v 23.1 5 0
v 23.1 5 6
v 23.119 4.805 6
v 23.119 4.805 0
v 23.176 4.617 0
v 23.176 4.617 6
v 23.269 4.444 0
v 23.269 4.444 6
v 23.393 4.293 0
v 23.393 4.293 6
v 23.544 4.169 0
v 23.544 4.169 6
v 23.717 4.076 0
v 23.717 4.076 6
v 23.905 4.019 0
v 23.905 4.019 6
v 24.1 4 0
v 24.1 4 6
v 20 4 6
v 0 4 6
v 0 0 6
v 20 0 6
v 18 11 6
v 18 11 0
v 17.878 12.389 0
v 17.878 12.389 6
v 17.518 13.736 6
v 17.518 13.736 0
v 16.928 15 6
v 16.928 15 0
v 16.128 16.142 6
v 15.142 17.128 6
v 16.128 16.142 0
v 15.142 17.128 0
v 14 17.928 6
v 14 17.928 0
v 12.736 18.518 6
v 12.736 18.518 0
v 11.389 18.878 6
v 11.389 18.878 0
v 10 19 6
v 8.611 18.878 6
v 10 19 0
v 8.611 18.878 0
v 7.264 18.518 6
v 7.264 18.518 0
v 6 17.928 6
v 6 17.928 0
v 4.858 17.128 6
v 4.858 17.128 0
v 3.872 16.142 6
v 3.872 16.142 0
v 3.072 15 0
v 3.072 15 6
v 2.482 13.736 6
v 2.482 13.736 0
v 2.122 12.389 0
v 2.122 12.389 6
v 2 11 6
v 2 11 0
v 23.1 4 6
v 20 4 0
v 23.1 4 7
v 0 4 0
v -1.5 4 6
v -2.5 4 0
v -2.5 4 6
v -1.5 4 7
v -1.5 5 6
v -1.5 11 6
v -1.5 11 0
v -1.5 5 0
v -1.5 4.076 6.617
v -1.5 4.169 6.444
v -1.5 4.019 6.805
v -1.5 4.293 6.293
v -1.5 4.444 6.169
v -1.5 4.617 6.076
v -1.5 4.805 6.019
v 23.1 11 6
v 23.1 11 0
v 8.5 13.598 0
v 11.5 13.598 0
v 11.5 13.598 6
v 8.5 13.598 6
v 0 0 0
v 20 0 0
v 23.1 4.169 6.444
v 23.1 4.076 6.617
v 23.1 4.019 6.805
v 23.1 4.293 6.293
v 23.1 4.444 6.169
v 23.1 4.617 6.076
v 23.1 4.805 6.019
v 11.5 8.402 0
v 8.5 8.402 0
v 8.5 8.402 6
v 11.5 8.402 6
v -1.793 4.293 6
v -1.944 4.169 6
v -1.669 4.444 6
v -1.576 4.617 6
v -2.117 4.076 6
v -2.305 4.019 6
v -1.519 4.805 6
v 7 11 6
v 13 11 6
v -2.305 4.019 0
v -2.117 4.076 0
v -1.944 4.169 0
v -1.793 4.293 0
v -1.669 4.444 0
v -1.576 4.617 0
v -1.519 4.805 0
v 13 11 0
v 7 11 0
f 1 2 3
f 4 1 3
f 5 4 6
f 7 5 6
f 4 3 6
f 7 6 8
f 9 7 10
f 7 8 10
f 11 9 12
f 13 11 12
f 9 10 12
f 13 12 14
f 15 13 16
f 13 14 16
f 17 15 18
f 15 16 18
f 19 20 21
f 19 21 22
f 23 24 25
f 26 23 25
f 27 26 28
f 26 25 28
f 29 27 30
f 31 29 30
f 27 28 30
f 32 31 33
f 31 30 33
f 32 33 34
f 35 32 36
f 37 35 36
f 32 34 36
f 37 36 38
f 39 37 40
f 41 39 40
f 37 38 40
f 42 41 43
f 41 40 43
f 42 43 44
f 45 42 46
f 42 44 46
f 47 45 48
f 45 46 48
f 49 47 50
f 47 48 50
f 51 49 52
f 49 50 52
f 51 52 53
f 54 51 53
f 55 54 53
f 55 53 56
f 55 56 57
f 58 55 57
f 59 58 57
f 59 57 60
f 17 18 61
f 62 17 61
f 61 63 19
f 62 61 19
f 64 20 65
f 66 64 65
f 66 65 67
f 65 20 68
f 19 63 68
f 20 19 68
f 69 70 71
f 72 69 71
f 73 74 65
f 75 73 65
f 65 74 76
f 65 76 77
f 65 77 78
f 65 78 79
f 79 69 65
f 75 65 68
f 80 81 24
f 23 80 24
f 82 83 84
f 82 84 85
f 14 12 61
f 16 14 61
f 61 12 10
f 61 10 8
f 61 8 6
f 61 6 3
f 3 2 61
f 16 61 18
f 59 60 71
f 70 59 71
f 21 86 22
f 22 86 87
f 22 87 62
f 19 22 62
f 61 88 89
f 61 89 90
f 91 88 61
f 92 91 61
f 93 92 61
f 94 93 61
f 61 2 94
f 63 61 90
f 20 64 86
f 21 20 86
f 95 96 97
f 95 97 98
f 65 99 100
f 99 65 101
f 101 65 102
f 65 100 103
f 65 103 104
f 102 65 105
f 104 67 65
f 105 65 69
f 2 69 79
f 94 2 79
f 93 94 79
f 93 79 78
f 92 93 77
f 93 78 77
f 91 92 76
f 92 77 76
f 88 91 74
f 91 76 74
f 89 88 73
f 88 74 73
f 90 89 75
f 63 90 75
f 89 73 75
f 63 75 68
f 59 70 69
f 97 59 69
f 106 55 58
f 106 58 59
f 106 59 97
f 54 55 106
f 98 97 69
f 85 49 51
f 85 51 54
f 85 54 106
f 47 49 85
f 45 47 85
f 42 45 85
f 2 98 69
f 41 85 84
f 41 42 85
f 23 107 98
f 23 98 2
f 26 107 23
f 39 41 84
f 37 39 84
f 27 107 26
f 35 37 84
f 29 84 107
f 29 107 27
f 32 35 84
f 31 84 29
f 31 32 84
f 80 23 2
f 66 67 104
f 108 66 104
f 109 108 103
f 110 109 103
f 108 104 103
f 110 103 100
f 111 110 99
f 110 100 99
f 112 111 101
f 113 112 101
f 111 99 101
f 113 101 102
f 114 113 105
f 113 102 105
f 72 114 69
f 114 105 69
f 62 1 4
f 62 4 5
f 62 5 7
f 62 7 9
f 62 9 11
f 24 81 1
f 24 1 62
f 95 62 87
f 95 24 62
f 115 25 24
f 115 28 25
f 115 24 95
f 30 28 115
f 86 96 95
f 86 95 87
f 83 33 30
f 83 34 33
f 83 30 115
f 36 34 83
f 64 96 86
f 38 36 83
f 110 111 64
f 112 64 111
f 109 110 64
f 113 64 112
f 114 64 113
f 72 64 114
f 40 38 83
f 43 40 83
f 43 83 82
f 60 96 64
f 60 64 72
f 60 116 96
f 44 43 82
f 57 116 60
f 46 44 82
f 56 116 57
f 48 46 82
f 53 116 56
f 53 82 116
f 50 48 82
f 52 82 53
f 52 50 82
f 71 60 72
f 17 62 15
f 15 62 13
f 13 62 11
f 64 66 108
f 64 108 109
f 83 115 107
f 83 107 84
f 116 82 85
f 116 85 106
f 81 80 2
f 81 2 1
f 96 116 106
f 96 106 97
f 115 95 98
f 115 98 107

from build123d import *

# Parameters (mm, degrees)
BOSS_EXTRUDE1_DEPTH = 6
BOSS_EXTRUDE2_DEPTH = 24.6
BOSS_EXTRUDE3_DEPTH = 6


with BuildPart() as part:
    # Sketch1 → Boss-Extrude1 (new body)
    with BuildSketch(Plane.XY):
        with BuildLine():
            Line((0, 0), (20, 0))
            Line((20, 0), (20, 4))
            Line((20, 4), (23.1, 4))
            Line((23.1, 4), (23.1, 11))
            Line((23.1, 11), (18, 11))
            ThreePointArc((18, 11), (10, 19), (2, 11))
            Line((2, 11), (-1.5, 11))
            Line((-1.5, 11), (-1.5, 4))
            Line((-1.5, 4), (0, 4))
            Line((0, 4), (0, 0))
        make_face()
        Polygon((13, 11), (11.5, 13.598076211), (8.5, 13.598076211), (7, 11), (8.5, 8.401923789), (11.5, 8.401923789), align=None, mode=Mode.SUBTRACT)
    extrude(amount=BOSS_EXTRUDE1_DEPTH)

    # Sketch2 → Boss-Extrude2 (add)
    with BuildSketch(Plane.ZY.offset(1.5)):
        with BuildLine():
            Line((6, 4), (6, 5))
            ThreePointArc((6, 5), (6.292893219, 4.292893219), (7, 4))
            Line((7, 4), (6, 4))
        make_face()
    extrude(amount=-BOSS_EXTRUDE2_DEPTH)

    # Sketch4 → Boss-Extrude3 (add)
    with BuildSketch(Plane.XY.offset(6)):
        with BuildLine():
            Line((23.1, 4), (23.1, 5))
            ThreePointArc((23.1, 5), (23.392893219, 4.292893219), (24.1, 4))
            Line((24.1, 4), (23.1, 4))
        make_face()
        with BuildLine():
            Line((-1.5, 4), (-2.5, 4))
            ThreePointArc((-2.5, 4), (-1.792893219, 4.292893219), (-1.5, 5))
            Line((-1.5, 5), (-1.5, 4))
        make_face()
    extrude(amount=-BOSS_EXTRUDE3_DEPTH)


solid = part.part
